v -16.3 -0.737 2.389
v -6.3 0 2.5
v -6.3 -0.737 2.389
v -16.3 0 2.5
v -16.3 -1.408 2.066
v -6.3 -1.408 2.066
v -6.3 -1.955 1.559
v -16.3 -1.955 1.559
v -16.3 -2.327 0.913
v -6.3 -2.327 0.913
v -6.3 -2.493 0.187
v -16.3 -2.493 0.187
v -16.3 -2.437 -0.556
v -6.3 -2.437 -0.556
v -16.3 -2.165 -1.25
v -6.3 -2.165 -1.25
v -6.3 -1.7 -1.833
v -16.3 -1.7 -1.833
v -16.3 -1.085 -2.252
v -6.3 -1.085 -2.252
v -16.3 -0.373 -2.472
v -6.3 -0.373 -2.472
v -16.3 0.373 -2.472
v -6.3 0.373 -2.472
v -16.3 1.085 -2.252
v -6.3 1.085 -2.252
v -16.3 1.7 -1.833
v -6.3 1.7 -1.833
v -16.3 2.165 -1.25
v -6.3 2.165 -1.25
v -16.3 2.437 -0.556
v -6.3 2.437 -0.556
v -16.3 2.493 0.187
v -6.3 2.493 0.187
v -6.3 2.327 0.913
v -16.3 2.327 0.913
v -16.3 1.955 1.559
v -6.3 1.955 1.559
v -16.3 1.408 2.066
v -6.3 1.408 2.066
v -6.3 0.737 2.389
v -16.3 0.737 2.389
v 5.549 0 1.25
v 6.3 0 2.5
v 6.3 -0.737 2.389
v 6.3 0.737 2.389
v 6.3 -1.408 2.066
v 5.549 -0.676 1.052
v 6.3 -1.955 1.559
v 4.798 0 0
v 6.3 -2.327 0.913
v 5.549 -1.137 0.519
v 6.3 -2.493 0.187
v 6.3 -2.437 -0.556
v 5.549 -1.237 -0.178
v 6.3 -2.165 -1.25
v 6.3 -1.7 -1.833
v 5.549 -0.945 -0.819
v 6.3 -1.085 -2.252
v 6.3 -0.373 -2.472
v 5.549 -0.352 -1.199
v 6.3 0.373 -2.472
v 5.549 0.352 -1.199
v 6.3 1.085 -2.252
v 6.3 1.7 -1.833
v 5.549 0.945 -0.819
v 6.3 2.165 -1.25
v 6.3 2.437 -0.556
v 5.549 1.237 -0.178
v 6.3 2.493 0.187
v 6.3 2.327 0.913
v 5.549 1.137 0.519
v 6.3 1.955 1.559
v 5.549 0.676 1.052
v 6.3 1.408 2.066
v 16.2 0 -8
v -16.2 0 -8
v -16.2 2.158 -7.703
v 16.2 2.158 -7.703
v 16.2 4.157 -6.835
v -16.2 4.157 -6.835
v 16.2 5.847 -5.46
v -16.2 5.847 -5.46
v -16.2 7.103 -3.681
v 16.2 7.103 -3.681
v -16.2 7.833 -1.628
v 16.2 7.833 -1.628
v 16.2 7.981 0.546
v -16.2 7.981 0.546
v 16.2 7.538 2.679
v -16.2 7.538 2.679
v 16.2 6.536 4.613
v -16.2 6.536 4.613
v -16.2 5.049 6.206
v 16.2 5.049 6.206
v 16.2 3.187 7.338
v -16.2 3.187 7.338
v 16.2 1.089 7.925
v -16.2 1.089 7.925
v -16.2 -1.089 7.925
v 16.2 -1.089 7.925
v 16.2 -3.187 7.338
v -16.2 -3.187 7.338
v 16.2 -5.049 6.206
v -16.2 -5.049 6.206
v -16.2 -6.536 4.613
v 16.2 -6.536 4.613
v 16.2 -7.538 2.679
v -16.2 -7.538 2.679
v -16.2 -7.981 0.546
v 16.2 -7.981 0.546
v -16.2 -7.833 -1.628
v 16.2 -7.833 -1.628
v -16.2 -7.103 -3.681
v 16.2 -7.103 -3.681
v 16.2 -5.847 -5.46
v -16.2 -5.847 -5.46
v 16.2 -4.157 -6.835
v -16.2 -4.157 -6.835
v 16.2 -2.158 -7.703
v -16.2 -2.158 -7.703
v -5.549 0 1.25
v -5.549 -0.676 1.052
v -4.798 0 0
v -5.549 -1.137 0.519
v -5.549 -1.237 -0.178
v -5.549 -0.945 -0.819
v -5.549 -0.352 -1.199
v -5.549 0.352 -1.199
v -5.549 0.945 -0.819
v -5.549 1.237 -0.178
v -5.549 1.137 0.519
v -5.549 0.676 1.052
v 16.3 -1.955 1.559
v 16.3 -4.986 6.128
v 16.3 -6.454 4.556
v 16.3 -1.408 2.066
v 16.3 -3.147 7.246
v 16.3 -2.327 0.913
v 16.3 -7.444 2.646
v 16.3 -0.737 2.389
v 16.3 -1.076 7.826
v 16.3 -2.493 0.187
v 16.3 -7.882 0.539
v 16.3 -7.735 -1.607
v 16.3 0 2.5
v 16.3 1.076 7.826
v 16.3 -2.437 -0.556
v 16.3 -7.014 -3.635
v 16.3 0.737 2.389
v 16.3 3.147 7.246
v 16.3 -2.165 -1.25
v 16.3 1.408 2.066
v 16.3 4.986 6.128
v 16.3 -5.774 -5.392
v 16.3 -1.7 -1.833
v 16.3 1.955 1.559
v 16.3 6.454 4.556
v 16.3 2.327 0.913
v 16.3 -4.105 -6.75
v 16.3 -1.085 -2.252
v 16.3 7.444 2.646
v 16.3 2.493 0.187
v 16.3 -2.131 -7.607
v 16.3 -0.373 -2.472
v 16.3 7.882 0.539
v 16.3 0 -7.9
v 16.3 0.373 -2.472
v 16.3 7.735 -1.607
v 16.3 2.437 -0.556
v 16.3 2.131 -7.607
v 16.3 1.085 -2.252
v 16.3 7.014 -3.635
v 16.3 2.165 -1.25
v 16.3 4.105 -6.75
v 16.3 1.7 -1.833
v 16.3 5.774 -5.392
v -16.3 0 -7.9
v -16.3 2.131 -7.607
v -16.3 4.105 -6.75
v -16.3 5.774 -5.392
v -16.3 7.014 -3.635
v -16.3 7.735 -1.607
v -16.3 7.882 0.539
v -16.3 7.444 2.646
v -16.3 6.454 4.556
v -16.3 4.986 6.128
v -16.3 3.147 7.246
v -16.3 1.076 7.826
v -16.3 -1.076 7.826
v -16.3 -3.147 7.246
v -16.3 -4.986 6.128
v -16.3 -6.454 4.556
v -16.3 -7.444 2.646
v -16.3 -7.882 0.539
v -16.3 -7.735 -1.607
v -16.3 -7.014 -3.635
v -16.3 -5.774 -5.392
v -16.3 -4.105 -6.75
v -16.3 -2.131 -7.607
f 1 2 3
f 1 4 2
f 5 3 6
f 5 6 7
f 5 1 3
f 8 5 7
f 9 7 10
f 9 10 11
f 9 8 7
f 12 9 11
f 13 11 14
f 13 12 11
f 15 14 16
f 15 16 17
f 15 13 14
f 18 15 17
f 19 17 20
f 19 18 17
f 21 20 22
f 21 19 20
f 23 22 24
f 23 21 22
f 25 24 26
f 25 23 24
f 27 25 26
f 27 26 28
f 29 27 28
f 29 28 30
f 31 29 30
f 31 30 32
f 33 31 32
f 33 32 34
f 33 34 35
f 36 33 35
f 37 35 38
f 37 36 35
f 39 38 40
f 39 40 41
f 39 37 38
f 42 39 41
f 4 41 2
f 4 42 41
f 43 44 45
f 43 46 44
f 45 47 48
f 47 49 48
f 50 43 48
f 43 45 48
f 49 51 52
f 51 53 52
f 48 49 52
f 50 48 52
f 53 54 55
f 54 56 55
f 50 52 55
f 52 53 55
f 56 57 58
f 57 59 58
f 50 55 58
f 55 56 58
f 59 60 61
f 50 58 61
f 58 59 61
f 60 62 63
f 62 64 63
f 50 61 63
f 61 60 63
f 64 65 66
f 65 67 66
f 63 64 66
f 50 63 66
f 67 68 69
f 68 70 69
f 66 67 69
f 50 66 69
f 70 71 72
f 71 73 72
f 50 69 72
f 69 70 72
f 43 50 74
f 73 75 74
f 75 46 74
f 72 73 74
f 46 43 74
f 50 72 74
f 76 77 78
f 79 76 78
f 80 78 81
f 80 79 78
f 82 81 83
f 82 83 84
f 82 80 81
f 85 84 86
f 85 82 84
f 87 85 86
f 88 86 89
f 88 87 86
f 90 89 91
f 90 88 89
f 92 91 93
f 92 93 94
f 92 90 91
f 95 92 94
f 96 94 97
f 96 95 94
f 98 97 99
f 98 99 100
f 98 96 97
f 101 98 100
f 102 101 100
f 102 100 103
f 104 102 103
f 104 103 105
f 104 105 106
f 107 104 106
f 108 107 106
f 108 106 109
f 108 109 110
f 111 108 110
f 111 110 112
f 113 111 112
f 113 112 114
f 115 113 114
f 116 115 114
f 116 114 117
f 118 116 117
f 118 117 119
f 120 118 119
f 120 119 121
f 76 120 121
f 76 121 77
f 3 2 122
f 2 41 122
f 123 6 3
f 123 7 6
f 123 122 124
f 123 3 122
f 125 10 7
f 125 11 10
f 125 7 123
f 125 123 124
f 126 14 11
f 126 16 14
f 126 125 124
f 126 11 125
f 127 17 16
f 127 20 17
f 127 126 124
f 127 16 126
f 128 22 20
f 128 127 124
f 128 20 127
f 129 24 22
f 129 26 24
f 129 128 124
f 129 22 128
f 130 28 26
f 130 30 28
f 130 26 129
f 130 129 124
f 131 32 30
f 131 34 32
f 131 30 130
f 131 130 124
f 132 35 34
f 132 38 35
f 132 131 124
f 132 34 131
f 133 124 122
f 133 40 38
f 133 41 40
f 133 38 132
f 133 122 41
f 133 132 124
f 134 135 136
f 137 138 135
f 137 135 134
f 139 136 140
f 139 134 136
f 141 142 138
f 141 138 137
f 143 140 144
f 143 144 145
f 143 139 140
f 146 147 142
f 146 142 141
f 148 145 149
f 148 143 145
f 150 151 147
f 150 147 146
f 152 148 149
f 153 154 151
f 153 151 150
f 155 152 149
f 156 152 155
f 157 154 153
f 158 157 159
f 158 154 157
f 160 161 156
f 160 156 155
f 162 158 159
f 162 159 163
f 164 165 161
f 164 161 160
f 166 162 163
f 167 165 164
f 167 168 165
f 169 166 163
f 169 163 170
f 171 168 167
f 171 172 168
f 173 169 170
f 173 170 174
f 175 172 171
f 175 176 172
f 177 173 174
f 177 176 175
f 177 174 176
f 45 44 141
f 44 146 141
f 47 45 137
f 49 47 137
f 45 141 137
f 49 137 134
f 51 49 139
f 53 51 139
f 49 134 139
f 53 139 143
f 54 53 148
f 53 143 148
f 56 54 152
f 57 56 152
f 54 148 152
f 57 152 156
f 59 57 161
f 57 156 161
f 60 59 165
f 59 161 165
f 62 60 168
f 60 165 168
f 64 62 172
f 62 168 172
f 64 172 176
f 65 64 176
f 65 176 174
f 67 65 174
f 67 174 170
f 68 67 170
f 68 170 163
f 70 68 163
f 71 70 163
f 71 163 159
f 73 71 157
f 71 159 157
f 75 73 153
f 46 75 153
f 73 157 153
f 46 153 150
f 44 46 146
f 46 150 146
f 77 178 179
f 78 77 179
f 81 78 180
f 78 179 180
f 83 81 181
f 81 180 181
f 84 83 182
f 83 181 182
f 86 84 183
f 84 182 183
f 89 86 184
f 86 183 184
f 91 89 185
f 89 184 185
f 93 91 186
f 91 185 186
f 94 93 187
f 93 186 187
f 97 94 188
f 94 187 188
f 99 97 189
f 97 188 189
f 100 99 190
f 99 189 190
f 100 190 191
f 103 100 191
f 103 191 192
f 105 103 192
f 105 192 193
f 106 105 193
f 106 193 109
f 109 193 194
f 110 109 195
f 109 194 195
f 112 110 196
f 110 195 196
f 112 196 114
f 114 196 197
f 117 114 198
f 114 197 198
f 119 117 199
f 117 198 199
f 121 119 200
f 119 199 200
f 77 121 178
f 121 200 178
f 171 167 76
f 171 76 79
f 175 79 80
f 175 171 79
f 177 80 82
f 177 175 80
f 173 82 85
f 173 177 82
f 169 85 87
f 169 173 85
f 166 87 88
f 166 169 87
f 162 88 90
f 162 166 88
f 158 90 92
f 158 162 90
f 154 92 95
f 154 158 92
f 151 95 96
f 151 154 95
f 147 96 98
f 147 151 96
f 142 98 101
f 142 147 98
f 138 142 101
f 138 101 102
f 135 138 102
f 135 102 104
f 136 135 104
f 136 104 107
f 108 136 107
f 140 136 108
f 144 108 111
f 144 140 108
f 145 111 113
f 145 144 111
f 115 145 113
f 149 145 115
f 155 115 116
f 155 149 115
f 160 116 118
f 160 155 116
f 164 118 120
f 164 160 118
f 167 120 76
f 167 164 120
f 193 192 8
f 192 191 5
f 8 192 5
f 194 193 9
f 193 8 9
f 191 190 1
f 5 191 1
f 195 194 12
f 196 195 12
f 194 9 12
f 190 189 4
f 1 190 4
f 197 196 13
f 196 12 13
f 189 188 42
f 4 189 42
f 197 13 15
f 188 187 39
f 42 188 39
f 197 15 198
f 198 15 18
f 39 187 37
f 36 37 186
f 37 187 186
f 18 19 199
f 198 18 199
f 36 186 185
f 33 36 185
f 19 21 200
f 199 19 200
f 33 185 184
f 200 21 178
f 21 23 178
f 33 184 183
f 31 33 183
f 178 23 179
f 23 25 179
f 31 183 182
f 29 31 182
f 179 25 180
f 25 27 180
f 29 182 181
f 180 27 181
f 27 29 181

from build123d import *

# Parameters (mm, degrees)
SKETCH1_R           = 8
SKETCH1_R_2         = 3
BOSS_EXTRUDE1_DEPTH = 16.3
CHAMFER1_SIZE       = 0.1


with BuildPart() as part:
    # Sketch1 → Boss-Extrude1 (new, symmetric)
    with BuildSketch(Plane(origin=(0, 0, 0), x_dir=(0, 0, -1), z_dir=(1, 0, 0))):
        Circle(SKETCH1_R)
        Circle(SKETCH1_R_2, mode=Mode.SUBTRACT)
        Circle(SKETCH1_R_2)
    extrude(amount=BOSS_EXTRUDE1_DEPTH, both=True)

    # Sketch3 → M6 Tapped Hole1 (revolve, cut)
    with BuildSketch(Plane(origin=(-16.3, 0, 0), x_dir=(0, 0, 1), z_dir=(0, 1, 0))):
        Polygon((0, 0), (0, 11.502151548), (2.5, 10), (2.5, 0), align=None)
    m6_tapped_hole1 = revolve(axis=Axis((-22.65, 0, 0), (1, 0, 0)), mode=Mode.SUBTRACT)

    # Mirror1: M6 Tapped Hole1 across plane
    add(m6_tapped_hole1.mirror(Plane(origin=(0, 0, 0), x_dir=(0, 0, 1), z_dir=(1, 0, 0))), mode=Mode.SUBTRACT)

    # Chamfer1
    chamfer1_edges = [part.edges().sort_by_distance(p)[0] for p in [
        (-16.3, 0, 8),
        (16.3, 0, 8),
    ]]
    chamfer(chamfer1_edges, length=CHAMFER1_SIZE)


solid = part.part
